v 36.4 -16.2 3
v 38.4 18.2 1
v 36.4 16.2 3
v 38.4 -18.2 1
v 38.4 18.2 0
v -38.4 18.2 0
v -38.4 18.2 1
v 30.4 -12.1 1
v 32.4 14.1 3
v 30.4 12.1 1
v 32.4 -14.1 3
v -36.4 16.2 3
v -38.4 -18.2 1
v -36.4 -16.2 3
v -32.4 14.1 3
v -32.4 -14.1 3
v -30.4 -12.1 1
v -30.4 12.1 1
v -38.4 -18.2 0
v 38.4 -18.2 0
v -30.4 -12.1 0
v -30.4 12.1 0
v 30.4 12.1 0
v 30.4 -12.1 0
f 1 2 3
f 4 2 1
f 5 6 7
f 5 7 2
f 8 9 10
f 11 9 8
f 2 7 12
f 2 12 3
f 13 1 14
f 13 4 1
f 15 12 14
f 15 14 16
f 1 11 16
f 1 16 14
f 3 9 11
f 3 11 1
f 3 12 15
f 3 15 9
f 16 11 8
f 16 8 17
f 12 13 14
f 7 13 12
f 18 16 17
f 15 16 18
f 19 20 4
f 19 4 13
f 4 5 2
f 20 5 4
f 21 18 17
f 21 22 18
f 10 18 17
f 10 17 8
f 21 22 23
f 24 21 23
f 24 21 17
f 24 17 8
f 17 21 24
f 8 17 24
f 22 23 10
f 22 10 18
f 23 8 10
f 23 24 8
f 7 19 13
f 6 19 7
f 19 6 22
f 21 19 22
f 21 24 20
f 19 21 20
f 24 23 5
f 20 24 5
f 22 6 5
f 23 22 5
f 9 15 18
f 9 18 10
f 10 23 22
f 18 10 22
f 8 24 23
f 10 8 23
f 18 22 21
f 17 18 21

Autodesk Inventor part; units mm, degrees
ref_plane "YZ Plane" through (0, 0, 0) normal (1, 0, 0) x (0, 1, 0)
ref_plane "XZ Plane" through (0, 0, 0) normal (0, 1, 0) x (-1, 0, 0)
ref_plane "XY Plane" through (0, 0, 0) normal (0, 0, 1) x (1, 0, 0)
sketch "Skizze1" plane through (0, 0, 0) normal (0, 0, 1) x (1, 0, 0)
  line L0 (-38.4, 18.2) -> (38.4, 18.2)
  line L1 (38.4, 18.2) -> (38.4, -18.2)
  line L2 (38.4, -18.2) -> (-38.4, -18.2)
  line L3 (-38.4, -18.2) -> (-38.4, 18.2)
  line L4 (-38.4, 18.2) -> (38.4, -18.2) construction
  line L5 (38.4, 18.2) -> (-38.4, -18.2) construction
  line L6 (30.4, 12.1) -> (-30.4, 12.1)
  line L7 (-30.4, 12.1) -> (-30.4, -12.1)
  line L8 (-30.4, -12.1) -> (30.4, -12.1)
  line L9 (30.4, -12.1) -> (30.4, 12.1)
  line L10 (30.4, 12.1) -> (-30.4, -12.1) construction
  line L11 (-30.4, 12.1) -> (30.4, -12.1) construction
  point P0 (0, 0)
  dimension "d0" = 76.8
  dimension "d1" = 36.4
  dimension "d2" = 60.8
  dimension "d3" = 24.2
extrude "Extrusion1" add sketch "Skizze1" along normal blind 3
sketch "Skizze2" plane through (0, 0, 0) normal (0, 0, 1) x (1, 0, 0)
  line L0 (30.4, 12.1) -> (-30.4, 12.1)
  line L1 (-30.4, 12.1) -> (-30.4, -12.1)
  line L2 (-30.4, -12.1) -> (30.4, -12.1)
  line L3 (30.4, -12.1) -> (30.4, 12.1)
  line L4 (30.4, 12.1) -> (-30.4, -12.1) construction
  line L5 (-30.4, 12.1) -> (30.4, -12.1) construction
  point P0 (0, 0)
  dimension "d6" = 60.8
  dimension "d7" = 24.2
extrude "Extrusion2" add sketch "Skizze2" along normal blind 1 separate body
chamfer "Fase1" distance 2 angle 45 4 edges at (0, 12.1, 3) (-30.4, 0, 3) (0, -12.1, 3) (30.4, 0, 3)
chamfer "Fase2" distance 2 angle 45 4 edges at (38.4, 0, 3) (0, 18.2, 3) (-38.4, 0, 3) (0, -18.2, 3)
properties part number "Display" material "Kunststoff, undurchsichtig schwarz"
